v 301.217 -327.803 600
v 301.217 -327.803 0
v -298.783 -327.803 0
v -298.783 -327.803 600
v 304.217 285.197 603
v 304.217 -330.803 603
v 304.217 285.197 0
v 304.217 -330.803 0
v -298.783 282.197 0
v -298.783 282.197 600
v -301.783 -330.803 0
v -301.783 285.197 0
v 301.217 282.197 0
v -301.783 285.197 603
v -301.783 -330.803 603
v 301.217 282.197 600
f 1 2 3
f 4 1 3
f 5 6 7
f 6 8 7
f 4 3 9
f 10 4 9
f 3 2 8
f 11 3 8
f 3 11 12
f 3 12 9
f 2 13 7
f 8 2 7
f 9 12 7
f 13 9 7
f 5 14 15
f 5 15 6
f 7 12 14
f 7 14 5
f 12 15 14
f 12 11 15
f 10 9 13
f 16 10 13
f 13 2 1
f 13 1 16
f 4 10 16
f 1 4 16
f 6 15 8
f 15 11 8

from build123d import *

# Parameters (mm, degrees)
F0_W     = 3
F0_H     = 610
F1_DEPTH = 600
F2_W     = 606
F2_H     = 616
F3_DEPTH = 3


with BuildPart() as f1:
    # F0 (on Top) → F1 (new body)
    with BuildSketch(Plane.XY):
        Polygon((304.217247, 285.197261), (-301.782753, 285.197261), (-301.782753, 282.197261), (-298.782753, 282.197261), (301.217247, 282.197261), (304.217247, 282.197261), align=None)
        with Locations((-300.282753, -22.802739)):
            Rectangle(F0_W, F0_H)
        with Locations((302.717247, -22.802739)):
            Rectangle(F0_W, F0_H)
        Polygon((-298.782753, -327.802739), (-301.782753, -327.802739), (-301.782753, -330.802739), (304.217247, -330.802739), (304.217247, -327.802739), (301.217247, -327.802739), align=None)
    extrude(amount=F1_DEPTH)

    # F2 (on face) → F3 (join)
    with BuildSketch(Plane.XY.offset(600)):
        with Locations((1.217247, -22.802739)):
            Rectangle(F2_W, F2_H)
    extrude(amount=F3_DEPTH)


solid = f1.part
